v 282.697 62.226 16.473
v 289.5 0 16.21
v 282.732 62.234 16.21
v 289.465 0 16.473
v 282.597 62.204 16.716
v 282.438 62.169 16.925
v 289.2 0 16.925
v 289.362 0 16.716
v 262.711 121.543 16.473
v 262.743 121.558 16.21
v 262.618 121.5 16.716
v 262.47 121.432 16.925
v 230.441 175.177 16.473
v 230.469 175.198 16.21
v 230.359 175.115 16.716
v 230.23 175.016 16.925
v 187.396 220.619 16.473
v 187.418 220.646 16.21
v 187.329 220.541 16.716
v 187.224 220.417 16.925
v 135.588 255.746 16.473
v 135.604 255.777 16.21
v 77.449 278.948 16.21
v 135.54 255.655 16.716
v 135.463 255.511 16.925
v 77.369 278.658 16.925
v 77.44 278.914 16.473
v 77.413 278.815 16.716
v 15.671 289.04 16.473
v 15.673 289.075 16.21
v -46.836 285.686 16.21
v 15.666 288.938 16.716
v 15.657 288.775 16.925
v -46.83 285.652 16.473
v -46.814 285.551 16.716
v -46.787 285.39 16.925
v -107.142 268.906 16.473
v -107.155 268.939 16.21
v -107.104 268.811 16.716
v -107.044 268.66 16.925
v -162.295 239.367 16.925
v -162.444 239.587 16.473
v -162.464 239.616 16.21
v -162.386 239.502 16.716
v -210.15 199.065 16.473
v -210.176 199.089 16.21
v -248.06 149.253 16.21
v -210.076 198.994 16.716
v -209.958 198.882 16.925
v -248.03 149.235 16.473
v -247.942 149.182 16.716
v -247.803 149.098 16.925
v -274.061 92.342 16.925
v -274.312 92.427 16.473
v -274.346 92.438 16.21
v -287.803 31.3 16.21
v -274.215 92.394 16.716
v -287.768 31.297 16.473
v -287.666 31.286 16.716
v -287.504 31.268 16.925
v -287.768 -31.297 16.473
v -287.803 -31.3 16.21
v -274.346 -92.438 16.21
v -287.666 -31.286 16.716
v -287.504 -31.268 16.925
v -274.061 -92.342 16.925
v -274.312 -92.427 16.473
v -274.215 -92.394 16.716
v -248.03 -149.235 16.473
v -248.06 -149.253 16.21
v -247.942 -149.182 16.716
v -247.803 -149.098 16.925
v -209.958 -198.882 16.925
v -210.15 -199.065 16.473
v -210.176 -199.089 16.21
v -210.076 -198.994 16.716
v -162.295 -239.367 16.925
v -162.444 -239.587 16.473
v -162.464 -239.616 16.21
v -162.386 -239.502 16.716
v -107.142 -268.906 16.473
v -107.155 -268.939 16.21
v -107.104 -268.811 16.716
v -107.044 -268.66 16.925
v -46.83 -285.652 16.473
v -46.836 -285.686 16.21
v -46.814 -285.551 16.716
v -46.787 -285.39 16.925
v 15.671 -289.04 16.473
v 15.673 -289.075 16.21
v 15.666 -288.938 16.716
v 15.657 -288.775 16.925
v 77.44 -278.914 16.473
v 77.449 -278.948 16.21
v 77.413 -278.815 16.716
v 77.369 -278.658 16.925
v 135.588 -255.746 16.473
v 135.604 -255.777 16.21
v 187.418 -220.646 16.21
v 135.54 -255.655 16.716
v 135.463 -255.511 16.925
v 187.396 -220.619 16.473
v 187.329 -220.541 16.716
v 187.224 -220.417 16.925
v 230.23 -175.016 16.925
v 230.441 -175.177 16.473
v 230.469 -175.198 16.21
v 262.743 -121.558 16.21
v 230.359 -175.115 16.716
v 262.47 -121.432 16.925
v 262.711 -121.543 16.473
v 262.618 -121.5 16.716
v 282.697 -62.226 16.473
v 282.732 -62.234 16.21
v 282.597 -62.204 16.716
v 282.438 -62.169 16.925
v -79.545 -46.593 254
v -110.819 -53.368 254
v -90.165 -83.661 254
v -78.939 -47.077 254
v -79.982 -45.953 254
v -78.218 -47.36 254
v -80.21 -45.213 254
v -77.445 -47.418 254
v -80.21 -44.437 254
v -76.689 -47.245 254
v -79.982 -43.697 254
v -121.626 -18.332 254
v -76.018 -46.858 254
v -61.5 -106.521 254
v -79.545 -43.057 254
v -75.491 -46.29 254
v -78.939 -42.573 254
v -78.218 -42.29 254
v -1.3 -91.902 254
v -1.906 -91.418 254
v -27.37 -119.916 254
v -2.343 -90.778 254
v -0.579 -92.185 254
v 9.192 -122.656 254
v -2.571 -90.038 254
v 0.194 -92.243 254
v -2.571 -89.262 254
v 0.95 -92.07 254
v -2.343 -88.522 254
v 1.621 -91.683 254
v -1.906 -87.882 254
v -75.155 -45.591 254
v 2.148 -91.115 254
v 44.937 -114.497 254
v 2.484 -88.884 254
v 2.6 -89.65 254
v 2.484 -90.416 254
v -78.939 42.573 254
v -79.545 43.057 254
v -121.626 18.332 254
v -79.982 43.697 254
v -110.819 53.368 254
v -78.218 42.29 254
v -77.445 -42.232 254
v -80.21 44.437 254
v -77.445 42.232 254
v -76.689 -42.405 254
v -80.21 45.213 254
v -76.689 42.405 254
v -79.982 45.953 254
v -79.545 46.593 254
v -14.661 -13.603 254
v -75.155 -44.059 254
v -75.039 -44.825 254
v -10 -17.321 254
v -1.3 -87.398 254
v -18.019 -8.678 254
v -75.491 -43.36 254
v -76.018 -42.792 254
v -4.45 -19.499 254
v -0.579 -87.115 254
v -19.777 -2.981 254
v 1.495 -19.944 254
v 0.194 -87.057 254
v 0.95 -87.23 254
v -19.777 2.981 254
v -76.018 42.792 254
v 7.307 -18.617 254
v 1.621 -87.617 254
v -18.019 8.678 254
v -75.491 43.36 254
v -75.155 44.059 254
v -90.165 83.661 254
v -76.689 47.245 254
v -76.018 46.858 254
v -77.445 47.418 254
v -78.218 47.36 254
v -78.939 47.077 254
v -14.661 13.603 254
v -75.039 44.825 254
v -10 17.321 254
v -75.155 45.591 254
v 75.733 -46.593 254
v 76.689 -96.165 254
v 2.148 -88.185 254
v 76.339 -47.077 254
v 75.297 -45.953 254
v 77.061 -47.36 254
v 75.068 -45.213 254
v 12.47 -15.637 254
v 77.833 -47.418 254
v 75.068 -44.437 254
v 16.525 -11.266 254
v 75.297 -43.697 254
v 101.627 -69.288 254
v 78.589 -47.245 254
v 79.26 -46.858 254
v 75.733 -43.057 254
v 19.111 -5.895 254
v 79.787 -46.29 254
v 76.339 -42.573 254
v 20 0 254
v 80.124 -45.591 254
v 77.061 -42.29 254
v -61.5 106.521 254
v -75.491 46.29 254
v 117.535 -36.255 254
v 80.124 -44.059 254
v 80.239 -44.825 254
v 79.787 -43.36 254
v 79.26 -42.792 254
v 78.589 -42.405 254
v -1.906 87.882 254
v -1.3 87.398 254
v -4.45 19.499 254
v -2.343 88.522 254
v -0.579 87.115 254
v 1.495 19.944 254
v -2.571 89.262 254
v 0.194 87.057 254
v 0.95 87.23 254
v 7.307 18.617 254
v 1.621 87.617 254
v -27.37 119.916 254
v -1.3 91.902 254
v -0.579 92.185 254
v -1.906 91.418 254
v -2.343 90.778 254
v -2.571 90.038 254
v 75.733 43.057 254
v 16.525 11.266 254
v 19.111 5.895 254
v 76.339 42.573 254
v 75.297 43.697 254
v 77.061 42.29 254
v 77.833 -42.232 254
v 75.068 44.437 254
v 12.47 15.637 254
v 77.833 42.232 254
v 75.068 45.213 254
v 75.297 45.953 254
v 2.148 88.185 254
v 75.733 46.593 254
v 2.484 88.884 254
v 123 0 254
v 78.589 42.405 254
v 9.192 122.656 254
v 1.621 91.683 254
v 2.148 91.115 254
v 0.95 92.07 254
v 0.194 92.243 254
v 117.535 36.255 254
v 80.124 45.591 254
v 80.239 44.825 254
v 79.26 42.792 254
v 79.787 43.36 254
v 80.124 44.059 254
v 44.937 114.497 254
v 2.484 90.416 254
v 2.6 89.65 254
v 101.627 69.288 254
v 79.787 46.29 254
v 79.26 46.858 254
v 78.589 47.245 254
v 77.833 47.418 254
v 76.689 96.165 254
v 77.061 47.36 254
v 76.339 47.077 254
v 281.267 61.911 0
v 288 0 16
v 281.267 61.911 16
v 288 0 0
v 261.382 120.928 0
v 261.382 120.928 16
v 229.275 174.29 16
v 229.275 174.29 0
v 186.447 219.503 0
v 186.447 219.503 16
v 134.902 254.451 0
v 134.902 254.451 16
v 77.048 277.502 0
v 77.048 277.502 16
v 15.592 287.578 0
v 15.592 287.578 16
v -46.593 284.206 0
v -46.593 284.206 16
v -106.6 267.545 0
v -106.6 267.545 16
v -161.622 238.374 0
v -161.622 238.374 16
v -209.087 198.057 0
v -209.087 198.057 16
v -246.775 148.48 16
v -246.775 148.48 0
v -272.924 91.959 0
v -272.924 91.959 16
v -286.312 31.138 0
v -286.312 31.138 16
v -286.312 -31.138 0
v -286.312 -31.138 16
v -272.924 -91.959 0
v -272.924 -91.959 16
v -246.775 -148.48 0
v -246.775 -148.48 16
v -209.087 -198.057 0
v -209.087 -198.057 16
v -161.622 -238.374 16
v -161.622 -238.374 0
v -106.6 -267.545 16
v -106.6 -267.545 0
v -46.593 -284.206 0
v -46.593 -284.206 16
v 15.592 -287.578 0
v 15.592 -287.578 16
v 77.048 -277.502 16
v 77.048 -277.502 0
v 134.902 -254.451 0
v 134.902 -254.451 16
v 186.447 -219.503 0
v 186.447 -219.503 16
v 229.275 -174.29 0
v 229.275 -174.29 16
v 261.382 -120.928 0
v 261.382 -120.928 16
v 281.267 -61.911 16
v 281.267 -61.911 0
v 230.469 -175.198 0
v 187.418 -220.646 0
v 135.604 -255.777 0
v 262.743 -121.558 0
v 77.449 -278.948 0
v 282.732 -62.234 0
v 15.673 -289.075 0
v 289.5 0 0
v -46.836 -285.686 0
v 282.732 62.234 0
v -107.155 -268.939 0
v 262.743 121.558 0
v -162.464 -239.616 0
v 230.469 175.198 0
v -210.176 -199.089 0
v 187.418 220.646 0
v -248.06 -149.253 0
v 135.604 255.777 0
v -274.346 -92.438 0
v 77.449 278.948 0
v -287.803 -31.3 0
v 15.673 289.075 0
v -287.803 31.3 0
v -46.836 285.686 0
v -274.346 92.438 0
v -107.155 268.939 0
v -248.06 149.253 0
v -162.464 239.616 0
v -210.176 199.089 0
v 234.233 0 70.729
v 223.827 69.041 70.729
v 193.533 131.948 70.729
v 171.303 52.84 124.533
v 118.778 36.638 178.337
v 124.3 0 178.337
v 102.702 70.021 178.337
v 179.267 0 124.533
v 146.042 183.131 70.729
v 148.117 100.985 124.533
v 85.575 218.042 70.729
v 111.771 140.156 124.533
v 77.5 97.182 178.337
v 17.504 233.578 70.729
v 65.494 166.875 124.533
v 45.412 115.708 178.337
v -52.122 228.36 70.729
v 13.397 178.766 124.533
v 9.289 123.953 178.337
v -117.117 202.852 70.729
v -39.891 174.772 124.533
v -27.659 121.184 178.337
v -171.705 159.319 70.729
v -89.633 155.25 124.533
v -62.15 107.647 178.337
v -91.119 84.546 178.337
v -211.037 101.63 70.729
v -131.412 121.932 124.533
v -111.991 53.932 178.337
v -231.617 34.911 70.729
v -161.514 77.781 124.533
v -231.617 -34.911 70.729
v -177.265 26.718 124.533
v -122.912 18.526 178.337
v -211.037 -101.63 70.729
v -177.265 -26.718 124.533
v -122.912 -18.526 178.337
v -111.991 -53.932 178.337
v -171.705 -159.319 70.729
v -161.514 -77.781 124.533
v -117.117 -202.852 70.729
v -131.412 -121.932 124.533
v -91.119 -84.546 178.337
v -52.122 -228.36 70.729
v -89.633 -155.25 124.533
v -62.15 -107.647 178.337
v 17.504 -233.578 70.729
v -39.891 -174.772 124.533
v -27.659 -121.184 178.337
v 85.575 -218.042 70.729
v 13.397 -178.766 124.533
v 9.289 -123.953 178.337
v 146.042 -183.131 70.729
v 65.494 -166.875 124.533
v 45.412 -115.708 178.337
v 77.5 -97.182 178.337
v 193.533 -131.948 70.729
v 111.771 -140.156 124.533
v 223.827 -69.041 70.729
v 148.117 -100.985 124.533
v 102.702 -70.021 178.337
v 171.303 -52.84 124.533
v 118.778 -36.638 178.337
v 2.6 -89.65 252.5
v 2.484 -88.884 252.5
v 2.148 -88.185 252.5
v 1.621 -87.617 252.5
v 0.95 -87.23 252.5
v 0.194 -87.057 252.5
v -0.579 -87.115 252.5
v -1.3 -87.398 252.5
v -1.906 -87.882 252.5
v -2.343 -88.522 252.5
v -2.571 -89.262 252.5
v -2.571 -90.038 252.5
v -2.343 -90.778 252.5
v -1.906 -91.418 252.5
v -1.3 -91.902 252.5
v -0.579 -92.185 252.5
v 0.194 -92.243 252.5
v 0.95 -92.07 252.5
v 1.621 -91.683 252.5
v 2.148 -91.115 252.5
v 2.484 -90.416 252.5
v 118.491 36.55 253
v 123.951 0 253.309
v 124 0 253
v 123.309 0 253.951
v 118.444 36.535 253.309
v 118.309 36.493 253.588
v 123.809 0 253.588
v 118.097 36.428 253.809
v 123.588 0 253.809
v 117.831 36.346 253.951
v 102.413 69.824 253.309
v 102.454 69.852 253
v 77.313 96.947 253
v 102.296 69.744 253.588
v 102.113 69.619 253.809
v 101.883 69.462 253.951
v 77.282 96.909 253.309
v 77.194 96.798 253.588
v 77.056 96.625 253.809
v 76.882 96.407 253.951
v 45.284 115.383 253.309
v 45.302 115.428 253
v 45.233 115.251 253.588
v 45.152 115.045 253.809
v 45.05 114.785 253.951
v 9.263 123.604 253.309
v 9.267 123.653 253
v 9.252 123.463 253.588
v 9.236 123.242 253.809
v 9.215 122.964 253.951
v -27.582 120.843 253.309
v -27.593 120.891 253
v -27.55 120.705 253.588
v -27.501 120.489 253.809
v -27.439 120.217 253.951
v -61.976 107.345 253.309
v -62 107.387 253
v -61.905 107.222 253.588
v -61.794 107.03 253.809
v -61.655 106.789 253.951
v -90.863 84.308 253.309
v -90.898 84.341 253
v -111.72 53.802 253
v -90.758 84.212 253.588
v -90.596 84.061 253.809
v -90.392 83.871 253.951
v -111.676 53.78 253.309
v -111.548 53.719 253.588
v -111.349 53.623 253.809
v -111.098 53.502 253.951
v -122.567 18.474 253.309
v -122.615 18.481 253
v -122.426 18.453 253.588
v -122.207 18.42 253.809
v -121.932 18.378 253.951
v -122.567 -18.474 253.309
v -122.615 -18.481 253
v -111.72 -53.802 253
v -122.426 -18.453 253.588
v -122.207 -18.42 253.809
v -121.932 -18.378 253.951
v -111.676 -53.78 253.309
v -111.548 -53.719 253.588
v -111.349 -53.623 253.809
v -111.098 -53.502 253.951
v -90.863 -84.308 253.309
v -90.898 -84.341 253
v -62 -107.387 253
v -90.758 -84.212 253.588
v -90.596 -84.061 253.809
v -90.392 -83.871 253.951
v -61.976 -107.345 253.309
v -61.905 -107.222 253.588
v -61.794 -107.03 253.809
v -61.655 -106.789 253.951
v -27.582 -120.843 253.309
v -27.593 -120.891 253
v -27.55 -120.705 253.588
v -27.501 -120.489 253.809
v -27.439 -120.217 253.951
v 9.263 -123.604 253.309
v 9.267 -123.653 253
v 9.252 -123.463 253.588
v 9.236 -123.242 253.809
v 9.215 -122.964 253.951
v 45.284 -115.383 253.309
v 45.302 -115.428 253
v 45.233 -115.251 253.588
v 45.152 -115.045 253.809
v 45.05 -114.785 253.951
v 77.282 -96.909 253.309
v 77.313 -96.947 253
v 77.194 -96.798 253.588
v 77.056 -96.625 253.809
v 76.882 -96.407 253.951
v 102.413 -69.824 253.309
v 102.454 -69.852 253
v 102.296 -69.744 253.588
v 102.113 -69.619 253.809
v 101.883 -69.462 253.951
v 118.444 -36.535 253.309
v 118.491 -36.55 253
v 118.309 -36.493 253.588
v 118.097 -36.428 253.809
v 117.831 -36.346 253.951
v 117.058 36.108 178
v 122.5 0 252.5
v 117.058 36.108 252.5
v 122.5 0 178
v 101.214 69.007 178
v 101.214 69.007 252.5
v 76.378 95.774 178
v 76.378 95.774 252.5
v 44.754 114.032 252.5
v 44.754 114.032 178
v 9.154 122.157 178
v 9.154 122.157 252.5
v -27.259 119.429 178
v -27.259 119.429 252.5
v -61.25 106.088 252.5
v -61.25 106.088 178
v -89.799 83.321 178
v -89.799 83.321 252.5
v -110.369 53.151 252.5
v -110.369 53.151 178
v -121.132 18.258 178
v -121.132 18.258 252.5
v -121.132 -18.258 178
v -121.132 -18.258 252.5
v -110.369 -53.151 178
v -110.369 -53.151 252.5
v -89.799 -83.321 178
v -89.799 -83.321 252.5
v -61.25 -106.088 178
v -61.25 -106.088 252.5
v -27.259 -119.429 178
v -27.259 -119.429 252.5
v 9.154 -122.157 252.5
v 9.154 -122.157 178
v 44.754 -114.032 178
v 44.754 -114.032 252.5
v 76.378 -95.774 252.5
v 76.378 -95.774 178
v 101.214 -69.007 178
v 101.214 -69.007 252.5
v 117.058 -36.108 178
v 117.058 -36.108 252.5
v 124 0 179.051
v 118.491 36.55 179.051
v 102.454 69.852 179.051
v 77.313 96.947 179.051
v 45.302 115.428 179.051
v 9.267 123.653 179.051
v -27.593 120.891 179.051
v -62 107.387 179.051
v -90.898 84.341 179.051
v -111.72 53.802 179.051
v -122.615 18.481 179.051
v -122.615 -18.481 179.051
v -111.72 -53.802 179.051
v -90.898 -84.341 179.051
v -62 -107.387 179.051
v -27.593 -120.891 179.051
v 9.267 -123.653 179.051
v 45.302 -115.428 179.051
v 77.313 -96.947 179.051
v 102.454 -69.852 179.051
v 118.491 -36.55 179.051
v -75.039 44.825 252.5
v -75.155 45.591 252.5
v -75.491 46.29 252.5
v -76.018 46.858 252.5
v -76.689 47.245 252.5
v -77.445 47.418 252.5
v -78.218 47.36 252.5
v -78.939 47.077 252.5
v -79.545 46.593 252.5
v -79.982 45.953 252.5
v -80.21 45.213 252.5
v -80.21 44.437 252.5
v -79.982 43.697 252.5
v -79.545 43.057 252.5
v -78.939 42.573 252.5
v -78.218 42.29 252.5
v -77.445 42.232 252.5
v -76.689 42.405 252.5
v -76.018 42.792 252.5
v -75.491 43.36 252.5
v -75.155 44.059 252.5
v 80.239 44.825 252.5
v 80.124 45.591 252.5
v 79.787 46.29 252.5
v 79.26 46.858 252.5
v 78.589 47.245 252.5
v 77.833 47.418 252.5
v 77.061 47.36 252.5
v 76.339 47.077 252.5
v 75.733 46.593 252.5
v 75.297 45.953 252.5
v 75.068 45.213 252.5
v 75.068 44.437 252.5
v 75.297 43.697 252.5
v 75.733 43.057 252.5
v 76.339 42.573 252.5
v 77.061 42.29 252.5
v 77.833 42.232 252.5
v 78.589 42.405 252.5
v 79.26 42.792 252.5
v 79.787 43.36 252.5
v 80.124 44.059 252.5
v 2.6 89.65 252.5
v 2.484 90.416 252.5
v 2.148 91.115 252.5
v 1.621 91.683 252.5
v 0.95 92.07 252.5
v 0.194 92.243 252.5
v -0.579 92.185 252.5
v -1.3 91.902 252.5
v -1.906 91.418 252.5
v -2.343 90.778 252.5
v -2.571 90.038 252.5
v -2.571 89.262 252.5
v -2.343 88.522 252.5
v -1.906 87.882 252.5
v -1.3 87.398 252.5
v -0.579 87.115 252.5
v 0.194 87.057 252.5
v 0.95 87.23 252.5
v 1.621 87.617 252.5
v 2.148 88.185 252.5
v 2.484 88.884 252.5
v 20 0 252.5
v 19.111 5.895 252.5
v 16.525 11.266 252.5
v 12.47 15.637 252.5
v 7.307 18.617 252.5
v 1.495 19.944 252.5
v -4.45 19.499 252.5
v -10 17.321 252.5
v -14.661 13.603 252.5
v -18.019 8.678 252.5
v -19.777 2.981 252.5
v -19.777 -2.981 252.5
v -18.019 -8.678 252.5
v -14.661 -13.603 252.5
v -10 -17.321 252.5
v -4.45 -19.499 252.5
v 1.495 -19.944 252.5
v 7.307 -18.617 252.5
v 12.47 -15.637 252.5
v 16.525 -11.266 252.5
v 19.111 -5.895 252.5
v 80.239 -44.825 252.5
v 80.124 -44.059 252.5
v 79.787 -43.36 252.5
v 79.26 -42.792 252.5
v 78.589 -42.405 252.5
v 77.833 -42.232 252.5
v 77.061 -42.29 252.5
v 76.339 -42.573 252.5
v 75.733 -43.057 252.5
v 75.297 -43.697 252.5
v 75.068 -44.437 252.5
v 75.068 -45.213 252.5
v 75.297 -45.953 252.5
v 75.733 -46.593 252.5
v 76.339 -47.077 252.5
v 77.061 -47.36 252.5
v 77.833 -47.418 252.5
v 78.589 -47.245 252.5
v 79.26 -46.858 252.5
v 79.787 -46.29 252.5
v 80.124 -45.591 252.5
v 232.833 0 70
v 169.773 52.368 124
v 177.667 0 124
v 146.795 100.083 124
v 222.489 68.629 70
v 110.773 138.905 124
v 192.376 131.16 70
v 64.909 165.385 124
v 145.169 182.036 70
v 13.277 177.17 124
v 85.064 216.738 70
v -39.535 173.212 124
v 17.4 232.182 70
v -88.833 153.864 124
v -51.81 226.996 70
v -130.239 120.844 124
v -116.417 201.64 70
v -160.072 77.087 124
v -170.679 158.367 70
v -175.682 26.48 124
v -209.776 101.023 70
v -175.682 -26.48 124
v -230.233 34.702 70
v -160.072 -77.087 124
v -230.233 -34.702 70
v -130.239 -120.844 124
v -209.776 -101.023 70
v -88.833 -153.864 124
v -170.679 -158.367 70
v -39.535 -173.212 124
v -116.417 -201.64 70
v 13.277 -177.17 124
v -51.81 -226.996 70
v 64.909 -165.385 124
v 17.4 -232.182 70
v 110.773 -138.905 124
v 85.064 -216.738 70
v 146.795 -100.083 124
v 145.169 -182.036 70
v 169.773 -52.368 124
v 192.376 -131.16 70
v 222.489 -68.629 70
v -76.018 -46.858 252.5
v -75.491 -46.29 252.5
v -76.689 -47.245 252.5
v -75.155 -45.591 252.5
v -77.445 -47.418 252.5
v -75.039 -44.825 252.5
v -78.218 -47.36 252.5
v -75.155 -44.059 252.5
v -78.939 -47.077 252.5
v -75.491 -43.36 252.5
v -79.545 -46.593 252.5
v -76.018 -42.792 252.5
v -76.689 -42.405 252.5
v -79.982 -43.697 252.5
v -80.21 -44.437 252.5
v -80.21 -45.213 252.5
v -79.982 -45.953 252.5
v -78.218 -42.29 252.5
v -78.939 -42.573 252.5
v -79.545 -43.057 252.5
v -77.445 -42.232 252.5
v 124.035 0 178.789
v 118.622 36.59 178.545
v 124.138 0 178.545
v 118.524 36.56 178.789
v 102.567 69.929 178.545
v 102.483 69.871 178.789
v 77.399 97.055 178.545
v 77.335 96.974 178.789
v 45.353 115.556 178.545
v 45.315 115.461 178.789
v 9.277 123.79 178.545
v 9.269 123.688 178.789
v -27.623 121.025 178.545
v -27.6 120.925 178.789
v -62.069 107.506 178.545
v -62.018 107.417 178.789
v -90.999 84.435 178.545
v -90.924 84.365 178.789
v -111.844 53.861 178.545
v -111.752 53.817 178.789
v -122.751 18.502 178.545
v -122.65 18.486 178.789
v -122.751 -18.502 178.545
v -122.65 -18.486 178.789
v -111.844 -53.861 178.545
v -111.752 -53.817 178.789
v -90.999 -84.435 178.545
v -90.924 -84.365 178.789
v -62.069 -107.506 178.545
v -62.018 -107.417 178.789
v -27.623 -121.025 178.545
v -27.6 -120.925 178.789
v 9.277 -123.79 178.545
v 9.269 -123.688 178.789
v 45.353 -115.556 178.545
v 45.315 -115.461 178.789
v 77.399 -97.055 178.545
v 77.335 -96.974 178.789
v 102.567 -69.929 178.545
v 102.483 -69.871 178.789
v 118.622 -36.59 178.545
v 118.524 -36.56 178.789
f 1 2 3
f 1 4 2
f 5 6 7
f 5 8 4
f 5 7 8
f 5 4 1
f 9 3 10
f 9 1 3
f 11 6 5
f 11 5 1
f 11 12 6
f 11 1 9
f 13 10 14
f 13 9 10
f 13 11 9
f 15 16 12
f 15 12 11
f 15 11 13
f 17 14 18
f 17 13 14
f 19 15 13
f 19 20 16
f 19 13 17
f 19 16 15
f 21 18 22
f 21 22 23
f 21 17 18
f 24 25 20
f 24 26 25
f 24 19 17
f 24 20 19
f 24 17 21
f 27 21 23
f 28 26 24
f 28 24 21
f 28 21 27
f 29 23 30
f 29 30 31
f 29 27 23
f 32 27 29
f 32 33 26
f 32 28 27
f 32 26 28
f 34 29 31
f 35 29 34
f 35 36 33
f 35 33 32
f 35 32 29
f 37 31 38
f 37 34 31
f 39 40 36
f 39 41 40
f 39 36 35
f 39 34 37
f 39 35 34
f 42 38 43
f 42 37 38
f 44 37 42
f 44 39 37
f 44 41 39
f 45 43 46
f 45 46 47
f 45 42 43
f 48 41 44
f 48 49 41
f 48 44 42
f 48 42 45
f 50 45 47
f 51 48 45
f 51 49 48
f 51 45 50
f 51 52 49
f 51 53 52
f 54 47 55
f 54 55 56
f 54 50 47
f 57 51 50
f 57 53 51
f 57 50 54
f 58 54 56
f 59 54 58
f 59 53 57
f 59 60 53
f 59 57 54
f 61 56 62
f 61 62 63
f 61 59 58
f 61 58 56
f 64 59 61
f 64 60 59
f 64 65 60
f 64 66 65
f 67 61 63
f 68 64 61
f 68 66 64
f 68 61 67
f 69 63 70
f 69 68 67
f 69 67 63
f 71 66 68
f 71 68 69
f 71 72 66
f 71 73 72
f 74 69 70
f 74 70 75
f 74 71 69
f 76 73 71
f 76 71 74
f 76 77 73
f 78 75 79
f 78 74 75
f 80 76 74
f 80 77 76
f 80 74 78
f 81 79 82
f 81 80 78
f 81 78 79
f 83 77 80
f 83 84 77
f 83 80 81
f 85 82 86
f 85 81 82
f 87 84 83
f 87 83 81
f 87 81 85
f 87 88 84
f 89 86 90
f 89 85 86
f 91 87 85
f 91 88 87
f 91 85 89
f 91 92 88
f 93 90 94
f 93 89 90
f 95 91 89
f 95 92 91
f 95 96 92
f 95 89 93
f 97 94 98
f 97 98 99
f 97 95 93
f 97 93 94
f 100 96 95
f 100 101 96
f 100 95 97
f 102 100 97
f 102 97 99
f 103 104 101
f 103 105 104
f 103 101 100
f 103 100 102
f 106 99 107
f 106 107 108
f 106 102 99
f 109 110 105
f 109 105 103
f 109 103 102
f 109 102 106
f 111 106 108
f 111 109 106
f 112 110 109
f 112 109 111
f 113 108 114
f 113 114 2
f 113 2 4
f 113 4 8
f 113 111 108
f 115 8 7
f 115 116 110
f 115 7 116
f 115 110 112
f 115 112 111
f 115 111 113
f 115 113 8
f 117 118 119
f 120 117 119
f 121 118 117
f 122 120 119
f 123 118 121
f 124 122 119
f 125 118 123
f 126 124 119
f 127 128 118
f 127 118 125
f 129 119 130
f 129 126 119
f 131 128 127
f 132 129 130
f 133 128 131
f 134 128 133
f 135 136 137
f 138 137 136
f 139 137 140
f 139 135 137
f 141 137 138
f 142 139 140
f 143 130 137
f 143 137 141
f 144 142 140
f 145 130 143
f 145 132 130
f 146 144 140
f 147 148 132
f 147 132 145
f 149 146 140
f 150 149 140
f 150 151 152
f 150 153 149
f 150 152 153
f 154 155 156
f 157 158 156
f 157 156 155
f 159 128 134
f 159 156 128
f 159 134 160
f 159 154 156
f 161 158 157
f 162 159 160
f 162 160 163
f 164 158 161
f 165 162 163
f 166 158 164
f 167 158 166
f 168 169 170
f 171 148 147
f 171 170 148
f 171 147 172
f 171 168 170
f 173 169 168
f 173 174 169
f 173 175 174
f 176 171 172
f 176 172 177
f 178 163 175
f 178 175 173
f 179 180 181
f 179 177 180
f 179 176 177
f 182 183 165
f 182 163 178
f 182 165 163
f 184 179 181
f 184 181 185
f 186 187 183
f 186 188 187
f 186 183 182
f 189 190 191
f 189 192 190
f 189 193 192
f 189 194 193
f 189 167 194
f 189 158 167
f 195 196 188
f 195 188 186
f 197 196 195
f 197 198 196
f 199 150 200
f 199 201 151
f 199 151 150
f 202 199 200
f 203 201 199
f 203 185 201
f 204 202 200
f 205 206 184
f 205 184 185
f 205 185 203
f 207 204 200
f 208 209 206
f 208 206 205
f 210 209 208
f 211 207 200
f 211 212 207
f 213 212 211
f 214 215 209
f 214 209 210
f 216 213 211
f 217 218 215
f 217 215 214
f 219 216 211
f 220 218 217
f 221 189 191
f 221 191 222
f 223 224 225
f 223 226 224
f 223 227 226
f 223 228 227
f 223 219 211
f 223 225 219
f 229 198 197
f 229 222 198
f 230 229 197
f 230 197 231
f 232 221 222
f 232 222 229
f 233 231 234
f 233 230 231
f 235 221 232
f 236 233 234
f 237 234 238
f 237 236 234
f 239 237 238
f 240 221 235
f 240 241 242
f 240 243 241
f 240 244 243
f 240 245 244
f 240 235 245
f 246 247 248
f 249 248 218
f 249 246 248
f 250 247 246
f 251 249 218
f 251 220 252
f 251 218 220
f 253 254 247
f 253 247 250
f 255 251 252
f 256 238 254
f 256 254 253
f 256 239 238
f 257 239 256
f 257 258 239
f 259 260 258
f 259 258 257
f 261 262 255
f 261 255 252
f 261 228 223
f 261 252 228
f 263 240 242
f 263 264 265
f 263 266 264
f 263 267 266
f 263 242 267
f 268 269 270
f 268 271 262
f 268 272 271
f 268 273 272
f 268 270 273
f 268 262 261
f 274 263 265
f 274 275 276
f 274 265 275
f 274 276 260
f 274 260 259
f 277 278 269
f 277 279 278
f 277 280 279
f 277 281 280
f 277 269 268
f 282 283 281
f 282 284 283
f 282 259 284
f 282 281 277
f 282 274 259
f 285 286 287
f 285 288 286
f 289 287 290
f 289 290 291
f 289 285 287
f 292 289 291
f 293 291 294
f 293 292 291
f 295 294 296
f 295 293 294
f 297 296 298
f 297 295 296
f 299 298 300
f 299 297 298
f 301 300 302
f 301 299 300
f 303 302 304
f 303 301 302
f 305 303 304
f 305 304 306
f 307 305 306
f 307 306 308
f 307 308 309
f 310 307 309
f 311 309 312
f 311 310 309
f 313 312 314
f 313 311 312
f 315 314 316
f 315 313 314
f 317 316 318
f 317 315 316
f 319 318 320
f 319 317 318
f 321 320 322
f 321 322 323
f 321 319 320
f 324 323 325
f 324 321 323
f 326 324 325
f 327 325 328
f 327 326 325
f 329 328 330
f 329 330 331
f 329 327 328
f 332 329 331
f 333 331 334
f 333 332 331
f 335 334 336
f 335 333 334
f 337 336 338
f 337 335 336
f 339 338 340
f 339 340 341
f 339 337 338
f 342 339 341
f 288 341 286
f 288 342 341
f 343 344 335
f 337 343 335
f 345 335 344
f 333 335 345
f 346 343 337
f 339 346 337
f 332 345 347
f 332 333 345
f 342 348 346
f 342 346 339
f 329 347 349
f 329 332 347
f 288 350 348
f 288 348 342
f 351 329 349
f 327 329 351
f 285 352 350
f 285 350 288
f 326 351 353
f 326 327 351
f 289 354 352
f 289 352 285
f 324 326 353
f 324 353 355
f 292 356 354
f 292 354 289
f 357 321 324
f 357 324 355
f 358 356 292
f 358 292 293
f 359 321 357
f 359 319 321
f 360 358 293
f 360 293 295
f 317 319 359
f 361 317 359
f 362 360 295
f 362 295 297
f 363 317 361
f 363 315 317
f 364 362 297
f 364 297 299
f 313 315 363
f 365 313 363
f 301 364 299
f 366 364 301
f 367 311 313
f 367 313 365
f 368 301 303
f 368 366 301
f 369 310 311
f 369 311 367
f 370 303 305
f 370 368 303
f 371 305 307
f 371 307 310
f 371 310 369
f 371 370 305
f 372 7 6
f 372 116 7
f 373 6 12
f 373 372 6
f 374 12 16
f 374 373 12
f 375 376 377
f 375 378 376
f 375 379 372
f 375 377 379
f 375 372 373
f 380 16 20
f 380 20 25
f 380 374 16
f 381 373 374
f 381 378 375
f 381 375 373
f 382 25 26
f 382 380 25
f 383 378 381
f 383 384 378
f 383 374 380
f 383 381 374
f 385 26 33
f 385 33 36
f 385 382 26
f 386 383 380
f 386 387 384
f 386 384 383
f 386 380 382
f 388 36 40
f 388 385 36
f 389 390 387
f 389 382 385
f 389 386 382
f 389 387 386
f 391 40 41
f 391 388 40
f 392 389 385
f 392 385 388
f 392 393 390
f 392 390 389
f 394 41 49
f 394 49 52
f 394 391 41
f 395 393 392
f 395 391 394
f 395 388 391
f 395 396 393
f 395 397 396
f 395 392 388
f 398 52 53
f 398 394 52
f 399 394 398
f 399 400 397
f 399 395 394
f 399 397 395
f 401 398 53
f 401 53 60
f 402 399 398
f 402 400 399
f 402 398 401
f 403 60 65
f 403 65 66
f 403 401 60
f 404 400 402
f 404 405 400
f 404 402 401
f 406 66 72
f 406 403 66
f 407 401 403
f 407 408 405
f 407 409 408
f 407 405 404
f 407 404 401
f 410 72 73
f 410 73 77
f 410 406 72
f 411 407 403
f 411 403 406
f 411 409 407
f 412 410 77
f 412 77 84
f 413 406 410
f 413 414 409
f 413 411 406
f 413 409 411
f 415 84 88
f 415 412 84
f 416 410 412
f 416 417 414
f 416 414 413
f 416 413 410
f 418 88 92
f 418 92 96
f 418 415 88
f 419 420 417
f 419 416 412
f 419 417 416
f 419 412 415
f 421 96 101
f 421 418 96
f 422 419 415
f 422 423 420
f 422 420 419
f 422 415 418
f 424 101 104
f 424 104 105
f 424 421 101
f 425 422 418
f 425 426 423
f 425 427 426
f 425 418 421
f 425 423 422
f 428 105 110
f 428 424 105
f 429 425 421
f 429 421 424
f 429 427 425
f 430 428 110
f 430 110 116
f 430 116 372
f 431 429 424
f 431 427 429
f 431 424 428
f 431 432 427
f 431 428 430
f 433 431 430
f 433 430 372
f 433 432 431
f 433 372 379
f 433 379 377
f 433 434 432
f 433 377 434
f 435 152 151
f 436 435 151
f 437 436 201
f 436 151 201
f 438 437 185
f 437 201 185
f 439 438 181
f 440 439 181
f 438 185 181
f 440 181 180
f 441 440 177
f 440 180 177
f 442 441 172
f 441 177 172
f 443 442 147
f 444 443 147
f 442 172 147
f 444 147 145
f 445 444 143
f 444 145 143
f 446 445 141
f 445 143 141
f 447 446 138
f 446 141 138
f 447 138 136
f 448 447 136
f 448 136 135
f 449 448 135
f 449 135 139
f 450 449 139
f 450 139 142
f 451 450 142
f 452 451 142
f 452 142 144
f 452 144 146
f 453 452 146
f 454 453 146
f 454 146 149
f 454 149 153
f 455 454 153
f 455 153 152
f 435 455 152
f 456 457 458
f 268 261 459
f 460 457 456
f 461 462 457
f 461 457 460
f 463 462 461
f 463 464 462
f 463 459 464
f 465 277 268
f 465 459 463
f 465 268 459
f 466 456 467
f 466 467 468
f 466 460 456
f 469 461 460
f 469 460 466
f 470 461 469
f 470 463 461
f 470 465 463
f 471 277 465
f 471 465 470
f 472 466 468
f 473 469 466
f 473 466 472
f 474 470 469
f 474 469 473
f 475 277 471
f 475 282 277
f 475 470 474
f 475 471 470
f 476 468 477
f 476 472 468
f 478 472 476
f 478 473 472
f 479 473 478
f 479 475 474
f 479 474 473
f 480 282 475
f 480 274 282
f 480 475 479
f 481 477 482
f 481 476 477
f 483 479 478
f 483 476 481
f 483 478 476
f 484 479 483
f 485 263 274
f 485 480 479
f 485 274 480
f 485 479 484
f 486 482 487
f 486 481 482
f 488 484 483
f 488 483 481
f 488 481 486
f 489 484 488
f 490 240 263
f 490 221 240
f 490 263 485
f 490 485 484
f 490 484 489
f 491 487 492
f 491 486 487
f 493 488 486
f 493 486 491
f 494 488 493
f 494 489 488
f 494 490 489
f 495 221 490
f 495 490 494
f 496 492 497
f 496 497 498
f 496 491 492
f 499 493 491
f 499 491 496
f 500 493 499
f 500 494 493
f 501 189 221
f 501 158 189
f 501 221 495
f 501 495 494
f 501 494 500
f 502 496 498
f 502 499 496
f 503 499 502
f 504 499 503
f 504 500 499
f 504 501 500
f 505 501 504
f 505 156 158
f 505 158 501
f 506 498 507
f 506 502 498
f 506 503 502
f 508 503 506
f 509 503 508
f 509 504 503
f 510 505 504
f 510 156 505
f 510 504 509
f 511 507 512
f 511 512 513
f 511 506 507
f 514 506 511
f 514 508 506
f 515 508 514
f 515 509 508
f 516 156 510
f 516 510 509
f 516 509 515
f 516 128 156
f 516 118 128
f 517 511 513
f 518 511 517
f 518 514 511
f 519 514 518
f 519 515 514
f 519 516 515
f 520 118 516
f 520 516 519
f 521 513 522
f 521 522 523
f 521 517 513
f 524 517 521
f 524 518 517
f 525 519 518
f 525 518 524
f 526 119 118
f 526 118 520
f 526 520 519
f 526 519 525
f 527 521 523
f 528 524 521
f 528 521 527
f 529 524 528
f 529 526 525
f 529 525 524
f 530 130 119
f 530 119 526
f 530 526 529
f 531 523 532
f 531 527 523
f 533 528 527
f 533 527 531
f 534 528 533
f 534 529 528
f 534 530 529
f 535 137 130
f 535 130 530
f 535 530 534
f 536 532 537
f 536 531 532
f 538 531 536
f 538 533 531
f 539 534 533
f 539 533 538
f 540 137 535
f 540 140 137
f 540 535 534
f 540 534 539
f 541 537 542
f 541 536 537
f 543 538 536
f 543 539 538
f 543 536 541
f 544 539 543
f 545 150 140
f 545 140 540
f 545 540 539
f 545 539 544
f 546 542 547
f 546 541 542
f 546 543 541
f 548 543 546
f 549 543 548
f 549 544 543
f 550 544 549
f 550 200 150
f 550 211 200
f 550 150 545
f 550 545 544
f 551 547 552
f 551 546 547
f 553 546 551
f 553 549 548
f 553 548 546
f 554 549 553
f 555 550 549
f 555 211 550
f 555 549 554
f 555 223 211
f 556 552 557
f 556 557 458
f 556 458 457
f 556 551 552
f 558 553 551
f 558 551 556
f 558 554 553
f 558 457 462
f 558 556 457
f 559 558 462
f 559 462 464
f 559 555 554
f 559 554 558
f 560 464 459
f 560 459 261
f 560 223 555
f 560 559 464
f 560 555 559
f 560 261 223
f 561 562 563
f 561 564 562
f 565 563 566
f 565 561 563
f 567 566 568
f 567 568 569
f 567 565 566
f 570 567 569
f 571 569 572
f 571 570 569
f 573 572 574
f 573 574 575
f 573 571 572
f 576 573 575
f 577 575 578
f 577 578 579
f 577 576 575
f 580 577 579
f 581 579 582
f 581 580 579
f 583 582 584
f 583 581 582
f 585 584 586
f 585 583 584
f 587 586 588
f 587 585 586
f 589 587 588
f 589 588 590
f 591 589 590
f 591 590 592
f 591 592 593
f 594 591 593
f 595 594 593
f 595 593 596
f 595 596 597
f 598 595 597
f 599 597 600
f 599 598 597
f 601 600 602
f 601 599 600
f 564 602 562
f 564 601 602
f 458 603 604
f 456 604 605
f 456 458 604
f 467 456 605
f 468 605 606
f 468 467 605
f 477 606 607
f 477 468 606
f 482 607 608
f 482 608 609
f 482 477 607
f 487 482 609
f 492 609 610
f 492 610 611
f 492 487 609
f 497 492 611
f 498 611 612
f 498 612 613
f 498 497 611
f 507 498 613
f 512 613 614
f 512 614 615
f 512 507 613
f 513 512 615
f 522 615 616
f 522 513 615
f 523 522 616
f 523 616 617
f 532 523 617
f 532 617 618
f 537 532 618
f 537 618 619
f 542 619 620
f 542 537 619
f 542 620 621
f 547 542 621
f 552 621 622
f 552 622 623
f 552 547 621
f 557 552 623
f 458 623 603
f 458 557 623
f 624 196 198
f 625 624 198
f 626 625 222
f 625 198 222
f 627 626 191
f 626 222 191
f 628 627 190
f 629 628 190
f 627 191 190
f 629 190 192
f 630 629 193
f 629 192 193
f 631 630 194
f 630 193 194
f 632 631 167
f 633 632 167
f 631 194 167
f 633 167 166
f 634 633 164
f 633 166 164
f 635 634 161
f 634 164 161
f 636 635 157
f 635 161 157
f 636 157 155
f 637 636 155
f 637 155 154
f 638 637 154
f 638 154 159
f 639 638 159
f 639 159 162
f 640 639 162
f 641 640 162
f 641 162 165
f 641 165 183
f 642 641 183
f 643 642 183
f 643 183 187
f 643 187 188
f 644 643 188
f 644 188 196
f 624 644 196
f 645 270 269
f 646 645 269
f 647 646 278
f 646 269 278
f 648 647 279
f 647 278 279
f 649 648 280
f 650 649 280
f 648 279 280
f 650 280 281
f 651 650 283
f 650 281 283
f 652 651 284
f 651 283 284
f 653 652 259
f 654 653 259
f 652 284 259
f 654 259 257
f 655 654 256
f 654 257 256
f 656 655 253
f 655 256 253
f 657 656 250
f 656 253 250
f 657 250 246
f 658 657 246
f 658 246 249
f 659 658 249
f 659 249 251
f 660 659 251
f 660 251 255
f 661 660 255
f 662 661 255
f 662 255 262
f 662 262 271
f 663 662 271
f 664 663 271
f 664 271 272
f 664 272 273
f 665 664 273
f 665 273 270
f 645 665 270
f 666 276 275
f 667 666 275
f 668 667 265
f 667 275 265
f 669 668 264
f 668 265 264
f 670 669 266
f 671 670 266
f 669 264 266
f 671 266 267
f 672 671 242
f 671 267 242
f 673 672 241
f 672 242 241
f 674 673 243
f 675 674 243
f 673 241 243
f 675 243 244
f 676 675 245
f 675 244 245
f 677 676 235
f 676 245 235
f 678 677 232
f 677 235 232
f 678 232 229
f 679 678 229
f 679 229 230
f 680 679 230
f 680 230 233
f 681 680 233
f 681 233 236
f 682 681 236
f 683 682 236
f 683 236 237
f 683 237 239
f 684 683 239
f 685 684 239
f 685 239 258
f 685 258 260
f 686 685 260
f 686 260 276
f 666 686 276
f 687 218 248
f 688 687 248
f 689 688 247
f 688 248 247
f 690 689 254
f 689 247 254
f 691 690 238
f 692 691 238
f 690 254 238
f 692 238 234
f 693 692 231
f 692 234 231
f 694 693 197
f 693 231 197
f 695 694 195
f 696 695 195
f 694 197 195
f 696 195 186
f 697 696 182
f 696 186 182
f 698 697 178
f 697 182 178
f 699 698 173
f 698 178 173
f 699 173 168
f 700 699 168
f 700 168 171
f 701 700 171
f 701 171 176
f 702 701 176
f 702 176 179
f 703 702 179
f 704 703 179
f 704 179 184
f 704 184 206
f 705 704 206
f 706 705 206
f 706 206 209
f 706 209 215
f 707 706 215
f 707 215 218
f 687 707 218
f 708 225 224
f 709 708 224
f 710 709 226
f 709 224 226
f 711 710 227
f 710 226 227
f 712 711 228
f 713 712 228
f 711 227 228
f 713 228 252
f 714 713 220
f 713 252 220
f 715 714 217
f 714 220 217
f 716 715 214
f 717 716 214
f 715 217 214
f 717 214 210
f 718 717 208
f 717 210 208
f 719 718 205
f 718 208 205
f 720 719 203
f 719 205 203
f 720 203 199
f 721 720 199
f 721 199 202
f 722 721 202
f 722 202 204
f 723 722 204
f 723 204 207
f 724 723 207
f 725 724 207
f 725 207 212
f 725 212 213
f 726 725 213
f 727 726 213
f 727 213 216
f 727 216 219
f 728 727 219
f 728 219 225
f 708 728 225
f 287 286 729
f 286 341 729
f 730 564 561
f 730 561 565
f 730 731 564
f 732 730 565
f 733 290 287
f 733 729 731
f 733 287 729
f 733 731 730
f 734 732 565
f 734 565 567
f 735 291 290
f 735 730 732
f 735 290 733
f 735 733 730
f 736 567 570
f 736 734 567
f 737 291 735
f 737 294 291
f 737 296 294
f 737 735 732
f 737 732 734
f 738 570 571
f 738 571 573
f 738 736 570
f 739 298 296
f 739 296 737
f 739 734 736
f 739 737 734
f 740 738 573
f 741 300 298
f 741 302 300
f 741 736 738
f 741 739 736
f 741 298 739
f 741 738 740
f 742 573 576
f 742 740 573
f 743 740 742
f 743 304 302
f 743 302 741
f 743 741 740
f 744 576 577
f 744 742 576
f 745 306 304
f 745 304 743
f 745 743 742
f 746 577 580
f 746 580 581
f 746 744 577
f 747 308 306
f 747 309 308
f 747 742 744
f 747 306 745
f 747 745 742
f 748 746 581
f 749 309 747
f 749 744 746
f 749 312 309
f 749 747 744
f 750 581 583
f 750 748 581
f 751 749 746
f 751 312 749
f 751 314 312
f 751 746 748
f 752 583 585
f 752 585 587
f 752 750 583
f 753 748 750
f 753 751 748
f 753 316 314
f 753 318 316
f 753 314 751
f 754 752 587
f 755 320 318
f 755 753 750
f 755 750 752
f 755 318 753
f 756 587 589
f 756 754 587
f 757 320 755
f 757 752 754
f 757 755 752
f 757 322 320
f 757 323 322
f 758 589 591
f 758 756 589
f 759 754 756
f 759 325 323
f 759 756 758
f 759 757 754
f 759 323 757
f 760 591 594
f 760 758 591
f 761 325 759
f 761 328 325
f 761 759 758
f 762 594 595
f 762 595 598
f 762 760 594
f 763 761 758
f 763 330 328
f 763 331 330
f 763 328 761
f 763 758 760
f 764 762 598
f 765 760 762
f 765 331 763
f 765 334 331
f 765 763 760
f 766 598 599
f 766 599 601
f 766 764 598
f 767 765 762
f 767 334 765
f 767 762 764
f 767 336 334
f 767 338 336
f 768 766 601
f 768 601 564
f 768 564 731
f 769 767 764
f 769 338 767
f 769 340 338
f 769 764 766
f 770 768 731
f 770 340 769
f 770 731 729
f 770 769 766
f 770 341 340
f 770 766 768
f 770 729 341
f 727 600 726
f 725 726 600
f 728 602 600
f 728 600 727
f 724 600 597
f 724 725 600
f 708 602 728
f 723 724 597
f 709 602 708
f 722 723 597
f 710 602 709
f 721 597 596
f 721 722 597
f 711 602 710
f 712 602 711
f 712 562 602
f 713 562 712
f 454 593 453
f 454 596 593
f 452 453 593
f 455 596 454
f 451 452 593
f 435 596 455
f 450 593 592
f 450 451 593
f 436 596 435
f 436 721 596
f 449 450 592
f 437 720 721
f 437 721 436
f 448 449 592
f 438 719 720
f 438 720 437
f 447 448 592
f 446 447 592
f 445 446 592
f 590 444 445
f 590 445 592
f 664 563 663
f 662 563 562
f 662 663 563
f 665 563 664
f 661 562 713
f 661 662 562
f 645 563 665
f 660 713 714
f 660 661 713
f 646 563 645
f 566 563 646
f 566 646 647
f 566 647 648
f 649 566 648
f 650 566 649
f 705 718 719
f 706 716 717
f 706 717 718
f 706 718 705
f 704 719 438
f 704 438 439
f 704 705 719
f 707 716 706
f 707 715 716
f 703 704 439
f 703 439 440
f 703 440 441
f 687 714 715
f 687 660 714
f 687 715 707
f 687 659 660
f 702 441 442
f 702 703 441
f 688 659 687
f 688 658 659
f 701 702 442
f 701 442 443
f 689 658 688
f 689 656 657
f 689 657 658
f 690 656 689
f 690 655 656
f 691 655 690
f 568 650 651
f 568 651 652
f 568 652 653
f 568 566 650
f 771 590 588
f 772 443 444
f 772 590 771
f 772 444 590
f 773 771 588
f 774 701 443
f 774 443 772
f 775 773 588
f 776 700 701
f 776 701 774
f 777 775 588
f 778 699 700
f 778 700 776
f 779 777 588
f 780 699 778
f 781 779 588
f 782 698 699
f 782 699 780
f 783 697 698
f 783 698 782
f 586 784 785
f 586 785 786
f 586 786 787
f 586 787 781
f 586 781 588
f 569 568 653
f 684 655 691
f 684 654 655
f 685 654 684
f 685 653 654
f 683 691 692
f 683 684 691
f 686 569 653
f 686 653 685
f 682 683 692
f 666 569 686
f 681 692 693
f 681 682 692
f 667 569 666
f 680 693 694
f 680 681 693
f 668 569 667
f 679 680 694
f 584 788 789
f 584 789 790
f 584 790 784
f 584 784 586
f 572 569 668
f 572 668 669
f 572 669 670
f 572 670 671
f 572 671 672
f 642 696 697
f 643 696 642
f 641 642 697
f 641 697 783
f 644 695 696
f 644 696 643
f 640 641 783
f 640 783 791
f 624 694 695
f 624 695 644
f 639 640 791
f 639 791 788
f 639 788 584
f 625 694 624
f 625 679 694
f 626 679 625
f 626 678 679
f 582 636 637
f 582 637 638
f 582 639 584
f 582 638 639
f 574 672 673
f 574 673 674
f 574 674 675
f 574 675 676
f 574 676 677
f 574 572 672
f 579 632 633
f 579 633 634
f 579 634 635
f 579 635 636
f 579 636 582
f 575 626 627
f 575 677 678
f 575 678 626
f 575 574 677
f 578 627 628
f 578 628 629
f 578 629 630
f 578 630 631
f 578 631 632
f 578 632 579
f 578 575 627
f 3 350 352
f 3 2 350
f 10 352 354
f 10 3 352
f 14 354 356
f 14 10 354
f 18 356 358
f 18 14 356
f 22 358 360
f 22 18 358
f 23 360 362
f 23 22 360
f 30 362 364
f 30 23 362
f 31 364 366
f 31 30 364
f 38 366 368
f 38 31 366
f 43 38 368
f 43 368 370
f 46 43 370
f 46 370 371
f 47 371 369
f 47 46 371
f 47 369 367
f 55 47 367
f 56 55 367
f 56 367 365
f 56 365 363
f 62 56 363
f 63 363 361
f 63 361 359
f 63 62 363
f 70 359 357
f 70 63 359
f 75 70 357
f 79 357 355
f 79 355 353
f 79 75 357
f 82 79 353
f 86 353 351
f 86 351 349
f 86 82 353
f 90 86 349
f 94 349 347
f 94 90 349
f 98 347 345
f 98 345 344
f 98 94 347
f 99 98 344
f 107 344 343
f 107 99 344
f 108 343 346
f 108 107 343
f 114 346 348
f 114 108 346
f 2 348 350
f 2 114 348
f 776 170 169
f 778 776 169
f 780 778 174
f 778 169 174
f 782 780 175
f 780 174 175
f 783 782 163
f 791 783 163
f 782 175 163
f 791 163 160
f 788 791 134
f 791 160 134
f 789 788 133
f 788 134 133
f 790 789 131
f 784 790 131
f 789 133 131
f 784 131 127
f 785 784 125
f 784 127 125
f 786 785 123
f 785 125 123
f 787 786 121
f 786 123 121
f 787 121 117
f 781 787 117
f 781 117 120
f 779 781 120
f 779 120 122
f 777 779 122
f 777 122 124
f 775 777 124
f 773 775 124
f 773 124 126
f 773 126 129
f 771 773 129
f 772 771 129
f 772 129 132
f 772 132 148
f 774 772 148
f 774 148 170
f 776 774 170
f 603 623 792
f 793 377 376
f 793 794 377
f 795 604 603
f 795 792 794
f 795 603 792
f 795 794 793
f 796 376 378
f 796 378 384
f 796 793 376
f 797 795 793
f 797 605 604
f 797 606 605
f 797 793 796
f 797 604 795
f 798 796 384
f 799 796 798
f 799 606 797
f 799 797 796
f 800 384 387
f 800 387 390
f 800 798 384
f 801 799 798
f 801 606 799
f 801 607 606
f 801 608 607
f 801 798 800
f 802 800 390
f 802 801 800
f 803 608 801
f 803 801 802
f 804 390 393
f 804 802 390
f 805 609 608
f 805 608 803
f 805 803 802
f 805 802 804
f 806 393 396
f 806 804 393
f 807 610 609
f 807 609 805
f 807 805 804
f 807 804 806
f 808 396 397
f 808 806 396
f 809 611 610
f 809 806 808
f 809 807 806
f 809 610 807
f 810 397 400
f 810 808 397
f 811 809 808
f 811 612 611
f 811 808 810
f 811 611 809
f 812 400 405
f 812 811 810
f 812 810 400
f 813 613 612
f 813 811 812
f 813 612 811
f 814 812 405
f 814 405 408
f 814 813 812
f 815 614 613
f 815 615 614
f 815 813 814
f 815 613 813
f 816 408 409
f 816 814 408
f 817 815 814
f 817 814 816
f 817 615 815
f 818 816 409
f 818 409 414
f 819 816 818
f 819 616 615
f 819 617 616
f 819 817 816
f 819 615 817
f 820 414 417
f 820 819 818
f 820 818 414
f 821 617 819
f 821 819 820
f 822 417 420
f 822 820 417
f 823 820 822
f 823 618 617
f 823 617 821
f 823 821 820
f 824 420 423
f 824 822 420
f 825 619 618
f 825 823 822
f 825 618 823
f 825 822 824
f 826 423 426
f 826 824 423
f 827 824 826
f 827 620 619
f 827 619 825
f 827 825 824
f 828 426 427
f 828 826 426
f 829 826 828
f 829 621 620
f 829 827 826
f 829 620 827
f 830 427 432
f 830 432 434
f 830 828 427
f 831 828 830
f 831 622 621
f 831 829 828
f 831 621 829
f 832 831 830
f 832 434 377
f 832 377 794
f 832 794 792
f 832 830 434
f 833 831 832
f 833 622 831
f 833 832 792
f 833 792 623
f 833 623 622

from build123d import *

# Parameters (mm, degrees)
F2_R     = 5
F3_DEPTH = 1.5
F4_R     = 20
F5_DEPTH = 254.001
F6_R     = 2.6
F7_DEPTH = 254.001


with BuildPart() as f1:
    # F0 (on Front) → F1 (revolve)
    with BuildSketch(Plane.XZ):
        with BuildLine():
            Line((288, 16), (288, 0))
            Line((288, 0), (289.5, 0))
            Line((289.5, 0), (289.5, 16.210244))
            ThreePointArc((289.5, 16.210244), (289.421822, 16.597858), (289.19951, 16.924867))
            Line((289.19951, 16.924867), (124.30049, 178.336596))
            ThreePointArc((124.30049, 178.336596), (124.078178, 178.663604), (124, 179.051219))
            Line((124, 179.051219), (124, 253))
            ThreePointArc((124, 253), (123.707107, 253.707107), (123, 254))
            Line((123, 254), (0, 254))
            Line((0, 254), (0, 252.5))
            Line((0, 252.5), (122.5, 252.5))
            Line((122.5, 252.5), (122.5, 178))
            Line((122.5, 178), (288, 16))
        make_face()
    revolve(axis=Axis((0, 0, 126.25), (0, 0, 1)))

    # F2 (on face) → F3 (cut, through all)
    with BuildSketch(Plane.XY.offset(254)):
        Circle(F2_R)
    extrude(amount=-F3_DEPTH, mode=Mode.SUBTRACT)

    # F4 (on face) → F5 (cut, through all)
    with BuildSketch(Plane.XY.offset(254)):
        Circle(F4_R)
    extrude(amount=-F5_DEPTH, mode=Mode.SUBTRACT)

    # F6 (on face) → F7 (cut, through all)
    with BuildSketch(Plane.XY.offset(254)):
        with Locations((0, 89.65)):
            Circle(F6_R)
        with Locations((-77.639177, 44.825)):
            Circle(F6_R)
        with Locations((-77.639177, -44.825)):
            Circle(F6_R)
        with Locations((0, -89.65)):
            Circle(F6_R)
        with Locations((77.639177, -44.825)):
            Circle(F6_R)
        with Locations((77.639177, 44.825)):
            Circle(F6_R)
    extrude(amount=-F7_DEPTH, mode=Mode.SUBTRACT)


solid = f1.part
